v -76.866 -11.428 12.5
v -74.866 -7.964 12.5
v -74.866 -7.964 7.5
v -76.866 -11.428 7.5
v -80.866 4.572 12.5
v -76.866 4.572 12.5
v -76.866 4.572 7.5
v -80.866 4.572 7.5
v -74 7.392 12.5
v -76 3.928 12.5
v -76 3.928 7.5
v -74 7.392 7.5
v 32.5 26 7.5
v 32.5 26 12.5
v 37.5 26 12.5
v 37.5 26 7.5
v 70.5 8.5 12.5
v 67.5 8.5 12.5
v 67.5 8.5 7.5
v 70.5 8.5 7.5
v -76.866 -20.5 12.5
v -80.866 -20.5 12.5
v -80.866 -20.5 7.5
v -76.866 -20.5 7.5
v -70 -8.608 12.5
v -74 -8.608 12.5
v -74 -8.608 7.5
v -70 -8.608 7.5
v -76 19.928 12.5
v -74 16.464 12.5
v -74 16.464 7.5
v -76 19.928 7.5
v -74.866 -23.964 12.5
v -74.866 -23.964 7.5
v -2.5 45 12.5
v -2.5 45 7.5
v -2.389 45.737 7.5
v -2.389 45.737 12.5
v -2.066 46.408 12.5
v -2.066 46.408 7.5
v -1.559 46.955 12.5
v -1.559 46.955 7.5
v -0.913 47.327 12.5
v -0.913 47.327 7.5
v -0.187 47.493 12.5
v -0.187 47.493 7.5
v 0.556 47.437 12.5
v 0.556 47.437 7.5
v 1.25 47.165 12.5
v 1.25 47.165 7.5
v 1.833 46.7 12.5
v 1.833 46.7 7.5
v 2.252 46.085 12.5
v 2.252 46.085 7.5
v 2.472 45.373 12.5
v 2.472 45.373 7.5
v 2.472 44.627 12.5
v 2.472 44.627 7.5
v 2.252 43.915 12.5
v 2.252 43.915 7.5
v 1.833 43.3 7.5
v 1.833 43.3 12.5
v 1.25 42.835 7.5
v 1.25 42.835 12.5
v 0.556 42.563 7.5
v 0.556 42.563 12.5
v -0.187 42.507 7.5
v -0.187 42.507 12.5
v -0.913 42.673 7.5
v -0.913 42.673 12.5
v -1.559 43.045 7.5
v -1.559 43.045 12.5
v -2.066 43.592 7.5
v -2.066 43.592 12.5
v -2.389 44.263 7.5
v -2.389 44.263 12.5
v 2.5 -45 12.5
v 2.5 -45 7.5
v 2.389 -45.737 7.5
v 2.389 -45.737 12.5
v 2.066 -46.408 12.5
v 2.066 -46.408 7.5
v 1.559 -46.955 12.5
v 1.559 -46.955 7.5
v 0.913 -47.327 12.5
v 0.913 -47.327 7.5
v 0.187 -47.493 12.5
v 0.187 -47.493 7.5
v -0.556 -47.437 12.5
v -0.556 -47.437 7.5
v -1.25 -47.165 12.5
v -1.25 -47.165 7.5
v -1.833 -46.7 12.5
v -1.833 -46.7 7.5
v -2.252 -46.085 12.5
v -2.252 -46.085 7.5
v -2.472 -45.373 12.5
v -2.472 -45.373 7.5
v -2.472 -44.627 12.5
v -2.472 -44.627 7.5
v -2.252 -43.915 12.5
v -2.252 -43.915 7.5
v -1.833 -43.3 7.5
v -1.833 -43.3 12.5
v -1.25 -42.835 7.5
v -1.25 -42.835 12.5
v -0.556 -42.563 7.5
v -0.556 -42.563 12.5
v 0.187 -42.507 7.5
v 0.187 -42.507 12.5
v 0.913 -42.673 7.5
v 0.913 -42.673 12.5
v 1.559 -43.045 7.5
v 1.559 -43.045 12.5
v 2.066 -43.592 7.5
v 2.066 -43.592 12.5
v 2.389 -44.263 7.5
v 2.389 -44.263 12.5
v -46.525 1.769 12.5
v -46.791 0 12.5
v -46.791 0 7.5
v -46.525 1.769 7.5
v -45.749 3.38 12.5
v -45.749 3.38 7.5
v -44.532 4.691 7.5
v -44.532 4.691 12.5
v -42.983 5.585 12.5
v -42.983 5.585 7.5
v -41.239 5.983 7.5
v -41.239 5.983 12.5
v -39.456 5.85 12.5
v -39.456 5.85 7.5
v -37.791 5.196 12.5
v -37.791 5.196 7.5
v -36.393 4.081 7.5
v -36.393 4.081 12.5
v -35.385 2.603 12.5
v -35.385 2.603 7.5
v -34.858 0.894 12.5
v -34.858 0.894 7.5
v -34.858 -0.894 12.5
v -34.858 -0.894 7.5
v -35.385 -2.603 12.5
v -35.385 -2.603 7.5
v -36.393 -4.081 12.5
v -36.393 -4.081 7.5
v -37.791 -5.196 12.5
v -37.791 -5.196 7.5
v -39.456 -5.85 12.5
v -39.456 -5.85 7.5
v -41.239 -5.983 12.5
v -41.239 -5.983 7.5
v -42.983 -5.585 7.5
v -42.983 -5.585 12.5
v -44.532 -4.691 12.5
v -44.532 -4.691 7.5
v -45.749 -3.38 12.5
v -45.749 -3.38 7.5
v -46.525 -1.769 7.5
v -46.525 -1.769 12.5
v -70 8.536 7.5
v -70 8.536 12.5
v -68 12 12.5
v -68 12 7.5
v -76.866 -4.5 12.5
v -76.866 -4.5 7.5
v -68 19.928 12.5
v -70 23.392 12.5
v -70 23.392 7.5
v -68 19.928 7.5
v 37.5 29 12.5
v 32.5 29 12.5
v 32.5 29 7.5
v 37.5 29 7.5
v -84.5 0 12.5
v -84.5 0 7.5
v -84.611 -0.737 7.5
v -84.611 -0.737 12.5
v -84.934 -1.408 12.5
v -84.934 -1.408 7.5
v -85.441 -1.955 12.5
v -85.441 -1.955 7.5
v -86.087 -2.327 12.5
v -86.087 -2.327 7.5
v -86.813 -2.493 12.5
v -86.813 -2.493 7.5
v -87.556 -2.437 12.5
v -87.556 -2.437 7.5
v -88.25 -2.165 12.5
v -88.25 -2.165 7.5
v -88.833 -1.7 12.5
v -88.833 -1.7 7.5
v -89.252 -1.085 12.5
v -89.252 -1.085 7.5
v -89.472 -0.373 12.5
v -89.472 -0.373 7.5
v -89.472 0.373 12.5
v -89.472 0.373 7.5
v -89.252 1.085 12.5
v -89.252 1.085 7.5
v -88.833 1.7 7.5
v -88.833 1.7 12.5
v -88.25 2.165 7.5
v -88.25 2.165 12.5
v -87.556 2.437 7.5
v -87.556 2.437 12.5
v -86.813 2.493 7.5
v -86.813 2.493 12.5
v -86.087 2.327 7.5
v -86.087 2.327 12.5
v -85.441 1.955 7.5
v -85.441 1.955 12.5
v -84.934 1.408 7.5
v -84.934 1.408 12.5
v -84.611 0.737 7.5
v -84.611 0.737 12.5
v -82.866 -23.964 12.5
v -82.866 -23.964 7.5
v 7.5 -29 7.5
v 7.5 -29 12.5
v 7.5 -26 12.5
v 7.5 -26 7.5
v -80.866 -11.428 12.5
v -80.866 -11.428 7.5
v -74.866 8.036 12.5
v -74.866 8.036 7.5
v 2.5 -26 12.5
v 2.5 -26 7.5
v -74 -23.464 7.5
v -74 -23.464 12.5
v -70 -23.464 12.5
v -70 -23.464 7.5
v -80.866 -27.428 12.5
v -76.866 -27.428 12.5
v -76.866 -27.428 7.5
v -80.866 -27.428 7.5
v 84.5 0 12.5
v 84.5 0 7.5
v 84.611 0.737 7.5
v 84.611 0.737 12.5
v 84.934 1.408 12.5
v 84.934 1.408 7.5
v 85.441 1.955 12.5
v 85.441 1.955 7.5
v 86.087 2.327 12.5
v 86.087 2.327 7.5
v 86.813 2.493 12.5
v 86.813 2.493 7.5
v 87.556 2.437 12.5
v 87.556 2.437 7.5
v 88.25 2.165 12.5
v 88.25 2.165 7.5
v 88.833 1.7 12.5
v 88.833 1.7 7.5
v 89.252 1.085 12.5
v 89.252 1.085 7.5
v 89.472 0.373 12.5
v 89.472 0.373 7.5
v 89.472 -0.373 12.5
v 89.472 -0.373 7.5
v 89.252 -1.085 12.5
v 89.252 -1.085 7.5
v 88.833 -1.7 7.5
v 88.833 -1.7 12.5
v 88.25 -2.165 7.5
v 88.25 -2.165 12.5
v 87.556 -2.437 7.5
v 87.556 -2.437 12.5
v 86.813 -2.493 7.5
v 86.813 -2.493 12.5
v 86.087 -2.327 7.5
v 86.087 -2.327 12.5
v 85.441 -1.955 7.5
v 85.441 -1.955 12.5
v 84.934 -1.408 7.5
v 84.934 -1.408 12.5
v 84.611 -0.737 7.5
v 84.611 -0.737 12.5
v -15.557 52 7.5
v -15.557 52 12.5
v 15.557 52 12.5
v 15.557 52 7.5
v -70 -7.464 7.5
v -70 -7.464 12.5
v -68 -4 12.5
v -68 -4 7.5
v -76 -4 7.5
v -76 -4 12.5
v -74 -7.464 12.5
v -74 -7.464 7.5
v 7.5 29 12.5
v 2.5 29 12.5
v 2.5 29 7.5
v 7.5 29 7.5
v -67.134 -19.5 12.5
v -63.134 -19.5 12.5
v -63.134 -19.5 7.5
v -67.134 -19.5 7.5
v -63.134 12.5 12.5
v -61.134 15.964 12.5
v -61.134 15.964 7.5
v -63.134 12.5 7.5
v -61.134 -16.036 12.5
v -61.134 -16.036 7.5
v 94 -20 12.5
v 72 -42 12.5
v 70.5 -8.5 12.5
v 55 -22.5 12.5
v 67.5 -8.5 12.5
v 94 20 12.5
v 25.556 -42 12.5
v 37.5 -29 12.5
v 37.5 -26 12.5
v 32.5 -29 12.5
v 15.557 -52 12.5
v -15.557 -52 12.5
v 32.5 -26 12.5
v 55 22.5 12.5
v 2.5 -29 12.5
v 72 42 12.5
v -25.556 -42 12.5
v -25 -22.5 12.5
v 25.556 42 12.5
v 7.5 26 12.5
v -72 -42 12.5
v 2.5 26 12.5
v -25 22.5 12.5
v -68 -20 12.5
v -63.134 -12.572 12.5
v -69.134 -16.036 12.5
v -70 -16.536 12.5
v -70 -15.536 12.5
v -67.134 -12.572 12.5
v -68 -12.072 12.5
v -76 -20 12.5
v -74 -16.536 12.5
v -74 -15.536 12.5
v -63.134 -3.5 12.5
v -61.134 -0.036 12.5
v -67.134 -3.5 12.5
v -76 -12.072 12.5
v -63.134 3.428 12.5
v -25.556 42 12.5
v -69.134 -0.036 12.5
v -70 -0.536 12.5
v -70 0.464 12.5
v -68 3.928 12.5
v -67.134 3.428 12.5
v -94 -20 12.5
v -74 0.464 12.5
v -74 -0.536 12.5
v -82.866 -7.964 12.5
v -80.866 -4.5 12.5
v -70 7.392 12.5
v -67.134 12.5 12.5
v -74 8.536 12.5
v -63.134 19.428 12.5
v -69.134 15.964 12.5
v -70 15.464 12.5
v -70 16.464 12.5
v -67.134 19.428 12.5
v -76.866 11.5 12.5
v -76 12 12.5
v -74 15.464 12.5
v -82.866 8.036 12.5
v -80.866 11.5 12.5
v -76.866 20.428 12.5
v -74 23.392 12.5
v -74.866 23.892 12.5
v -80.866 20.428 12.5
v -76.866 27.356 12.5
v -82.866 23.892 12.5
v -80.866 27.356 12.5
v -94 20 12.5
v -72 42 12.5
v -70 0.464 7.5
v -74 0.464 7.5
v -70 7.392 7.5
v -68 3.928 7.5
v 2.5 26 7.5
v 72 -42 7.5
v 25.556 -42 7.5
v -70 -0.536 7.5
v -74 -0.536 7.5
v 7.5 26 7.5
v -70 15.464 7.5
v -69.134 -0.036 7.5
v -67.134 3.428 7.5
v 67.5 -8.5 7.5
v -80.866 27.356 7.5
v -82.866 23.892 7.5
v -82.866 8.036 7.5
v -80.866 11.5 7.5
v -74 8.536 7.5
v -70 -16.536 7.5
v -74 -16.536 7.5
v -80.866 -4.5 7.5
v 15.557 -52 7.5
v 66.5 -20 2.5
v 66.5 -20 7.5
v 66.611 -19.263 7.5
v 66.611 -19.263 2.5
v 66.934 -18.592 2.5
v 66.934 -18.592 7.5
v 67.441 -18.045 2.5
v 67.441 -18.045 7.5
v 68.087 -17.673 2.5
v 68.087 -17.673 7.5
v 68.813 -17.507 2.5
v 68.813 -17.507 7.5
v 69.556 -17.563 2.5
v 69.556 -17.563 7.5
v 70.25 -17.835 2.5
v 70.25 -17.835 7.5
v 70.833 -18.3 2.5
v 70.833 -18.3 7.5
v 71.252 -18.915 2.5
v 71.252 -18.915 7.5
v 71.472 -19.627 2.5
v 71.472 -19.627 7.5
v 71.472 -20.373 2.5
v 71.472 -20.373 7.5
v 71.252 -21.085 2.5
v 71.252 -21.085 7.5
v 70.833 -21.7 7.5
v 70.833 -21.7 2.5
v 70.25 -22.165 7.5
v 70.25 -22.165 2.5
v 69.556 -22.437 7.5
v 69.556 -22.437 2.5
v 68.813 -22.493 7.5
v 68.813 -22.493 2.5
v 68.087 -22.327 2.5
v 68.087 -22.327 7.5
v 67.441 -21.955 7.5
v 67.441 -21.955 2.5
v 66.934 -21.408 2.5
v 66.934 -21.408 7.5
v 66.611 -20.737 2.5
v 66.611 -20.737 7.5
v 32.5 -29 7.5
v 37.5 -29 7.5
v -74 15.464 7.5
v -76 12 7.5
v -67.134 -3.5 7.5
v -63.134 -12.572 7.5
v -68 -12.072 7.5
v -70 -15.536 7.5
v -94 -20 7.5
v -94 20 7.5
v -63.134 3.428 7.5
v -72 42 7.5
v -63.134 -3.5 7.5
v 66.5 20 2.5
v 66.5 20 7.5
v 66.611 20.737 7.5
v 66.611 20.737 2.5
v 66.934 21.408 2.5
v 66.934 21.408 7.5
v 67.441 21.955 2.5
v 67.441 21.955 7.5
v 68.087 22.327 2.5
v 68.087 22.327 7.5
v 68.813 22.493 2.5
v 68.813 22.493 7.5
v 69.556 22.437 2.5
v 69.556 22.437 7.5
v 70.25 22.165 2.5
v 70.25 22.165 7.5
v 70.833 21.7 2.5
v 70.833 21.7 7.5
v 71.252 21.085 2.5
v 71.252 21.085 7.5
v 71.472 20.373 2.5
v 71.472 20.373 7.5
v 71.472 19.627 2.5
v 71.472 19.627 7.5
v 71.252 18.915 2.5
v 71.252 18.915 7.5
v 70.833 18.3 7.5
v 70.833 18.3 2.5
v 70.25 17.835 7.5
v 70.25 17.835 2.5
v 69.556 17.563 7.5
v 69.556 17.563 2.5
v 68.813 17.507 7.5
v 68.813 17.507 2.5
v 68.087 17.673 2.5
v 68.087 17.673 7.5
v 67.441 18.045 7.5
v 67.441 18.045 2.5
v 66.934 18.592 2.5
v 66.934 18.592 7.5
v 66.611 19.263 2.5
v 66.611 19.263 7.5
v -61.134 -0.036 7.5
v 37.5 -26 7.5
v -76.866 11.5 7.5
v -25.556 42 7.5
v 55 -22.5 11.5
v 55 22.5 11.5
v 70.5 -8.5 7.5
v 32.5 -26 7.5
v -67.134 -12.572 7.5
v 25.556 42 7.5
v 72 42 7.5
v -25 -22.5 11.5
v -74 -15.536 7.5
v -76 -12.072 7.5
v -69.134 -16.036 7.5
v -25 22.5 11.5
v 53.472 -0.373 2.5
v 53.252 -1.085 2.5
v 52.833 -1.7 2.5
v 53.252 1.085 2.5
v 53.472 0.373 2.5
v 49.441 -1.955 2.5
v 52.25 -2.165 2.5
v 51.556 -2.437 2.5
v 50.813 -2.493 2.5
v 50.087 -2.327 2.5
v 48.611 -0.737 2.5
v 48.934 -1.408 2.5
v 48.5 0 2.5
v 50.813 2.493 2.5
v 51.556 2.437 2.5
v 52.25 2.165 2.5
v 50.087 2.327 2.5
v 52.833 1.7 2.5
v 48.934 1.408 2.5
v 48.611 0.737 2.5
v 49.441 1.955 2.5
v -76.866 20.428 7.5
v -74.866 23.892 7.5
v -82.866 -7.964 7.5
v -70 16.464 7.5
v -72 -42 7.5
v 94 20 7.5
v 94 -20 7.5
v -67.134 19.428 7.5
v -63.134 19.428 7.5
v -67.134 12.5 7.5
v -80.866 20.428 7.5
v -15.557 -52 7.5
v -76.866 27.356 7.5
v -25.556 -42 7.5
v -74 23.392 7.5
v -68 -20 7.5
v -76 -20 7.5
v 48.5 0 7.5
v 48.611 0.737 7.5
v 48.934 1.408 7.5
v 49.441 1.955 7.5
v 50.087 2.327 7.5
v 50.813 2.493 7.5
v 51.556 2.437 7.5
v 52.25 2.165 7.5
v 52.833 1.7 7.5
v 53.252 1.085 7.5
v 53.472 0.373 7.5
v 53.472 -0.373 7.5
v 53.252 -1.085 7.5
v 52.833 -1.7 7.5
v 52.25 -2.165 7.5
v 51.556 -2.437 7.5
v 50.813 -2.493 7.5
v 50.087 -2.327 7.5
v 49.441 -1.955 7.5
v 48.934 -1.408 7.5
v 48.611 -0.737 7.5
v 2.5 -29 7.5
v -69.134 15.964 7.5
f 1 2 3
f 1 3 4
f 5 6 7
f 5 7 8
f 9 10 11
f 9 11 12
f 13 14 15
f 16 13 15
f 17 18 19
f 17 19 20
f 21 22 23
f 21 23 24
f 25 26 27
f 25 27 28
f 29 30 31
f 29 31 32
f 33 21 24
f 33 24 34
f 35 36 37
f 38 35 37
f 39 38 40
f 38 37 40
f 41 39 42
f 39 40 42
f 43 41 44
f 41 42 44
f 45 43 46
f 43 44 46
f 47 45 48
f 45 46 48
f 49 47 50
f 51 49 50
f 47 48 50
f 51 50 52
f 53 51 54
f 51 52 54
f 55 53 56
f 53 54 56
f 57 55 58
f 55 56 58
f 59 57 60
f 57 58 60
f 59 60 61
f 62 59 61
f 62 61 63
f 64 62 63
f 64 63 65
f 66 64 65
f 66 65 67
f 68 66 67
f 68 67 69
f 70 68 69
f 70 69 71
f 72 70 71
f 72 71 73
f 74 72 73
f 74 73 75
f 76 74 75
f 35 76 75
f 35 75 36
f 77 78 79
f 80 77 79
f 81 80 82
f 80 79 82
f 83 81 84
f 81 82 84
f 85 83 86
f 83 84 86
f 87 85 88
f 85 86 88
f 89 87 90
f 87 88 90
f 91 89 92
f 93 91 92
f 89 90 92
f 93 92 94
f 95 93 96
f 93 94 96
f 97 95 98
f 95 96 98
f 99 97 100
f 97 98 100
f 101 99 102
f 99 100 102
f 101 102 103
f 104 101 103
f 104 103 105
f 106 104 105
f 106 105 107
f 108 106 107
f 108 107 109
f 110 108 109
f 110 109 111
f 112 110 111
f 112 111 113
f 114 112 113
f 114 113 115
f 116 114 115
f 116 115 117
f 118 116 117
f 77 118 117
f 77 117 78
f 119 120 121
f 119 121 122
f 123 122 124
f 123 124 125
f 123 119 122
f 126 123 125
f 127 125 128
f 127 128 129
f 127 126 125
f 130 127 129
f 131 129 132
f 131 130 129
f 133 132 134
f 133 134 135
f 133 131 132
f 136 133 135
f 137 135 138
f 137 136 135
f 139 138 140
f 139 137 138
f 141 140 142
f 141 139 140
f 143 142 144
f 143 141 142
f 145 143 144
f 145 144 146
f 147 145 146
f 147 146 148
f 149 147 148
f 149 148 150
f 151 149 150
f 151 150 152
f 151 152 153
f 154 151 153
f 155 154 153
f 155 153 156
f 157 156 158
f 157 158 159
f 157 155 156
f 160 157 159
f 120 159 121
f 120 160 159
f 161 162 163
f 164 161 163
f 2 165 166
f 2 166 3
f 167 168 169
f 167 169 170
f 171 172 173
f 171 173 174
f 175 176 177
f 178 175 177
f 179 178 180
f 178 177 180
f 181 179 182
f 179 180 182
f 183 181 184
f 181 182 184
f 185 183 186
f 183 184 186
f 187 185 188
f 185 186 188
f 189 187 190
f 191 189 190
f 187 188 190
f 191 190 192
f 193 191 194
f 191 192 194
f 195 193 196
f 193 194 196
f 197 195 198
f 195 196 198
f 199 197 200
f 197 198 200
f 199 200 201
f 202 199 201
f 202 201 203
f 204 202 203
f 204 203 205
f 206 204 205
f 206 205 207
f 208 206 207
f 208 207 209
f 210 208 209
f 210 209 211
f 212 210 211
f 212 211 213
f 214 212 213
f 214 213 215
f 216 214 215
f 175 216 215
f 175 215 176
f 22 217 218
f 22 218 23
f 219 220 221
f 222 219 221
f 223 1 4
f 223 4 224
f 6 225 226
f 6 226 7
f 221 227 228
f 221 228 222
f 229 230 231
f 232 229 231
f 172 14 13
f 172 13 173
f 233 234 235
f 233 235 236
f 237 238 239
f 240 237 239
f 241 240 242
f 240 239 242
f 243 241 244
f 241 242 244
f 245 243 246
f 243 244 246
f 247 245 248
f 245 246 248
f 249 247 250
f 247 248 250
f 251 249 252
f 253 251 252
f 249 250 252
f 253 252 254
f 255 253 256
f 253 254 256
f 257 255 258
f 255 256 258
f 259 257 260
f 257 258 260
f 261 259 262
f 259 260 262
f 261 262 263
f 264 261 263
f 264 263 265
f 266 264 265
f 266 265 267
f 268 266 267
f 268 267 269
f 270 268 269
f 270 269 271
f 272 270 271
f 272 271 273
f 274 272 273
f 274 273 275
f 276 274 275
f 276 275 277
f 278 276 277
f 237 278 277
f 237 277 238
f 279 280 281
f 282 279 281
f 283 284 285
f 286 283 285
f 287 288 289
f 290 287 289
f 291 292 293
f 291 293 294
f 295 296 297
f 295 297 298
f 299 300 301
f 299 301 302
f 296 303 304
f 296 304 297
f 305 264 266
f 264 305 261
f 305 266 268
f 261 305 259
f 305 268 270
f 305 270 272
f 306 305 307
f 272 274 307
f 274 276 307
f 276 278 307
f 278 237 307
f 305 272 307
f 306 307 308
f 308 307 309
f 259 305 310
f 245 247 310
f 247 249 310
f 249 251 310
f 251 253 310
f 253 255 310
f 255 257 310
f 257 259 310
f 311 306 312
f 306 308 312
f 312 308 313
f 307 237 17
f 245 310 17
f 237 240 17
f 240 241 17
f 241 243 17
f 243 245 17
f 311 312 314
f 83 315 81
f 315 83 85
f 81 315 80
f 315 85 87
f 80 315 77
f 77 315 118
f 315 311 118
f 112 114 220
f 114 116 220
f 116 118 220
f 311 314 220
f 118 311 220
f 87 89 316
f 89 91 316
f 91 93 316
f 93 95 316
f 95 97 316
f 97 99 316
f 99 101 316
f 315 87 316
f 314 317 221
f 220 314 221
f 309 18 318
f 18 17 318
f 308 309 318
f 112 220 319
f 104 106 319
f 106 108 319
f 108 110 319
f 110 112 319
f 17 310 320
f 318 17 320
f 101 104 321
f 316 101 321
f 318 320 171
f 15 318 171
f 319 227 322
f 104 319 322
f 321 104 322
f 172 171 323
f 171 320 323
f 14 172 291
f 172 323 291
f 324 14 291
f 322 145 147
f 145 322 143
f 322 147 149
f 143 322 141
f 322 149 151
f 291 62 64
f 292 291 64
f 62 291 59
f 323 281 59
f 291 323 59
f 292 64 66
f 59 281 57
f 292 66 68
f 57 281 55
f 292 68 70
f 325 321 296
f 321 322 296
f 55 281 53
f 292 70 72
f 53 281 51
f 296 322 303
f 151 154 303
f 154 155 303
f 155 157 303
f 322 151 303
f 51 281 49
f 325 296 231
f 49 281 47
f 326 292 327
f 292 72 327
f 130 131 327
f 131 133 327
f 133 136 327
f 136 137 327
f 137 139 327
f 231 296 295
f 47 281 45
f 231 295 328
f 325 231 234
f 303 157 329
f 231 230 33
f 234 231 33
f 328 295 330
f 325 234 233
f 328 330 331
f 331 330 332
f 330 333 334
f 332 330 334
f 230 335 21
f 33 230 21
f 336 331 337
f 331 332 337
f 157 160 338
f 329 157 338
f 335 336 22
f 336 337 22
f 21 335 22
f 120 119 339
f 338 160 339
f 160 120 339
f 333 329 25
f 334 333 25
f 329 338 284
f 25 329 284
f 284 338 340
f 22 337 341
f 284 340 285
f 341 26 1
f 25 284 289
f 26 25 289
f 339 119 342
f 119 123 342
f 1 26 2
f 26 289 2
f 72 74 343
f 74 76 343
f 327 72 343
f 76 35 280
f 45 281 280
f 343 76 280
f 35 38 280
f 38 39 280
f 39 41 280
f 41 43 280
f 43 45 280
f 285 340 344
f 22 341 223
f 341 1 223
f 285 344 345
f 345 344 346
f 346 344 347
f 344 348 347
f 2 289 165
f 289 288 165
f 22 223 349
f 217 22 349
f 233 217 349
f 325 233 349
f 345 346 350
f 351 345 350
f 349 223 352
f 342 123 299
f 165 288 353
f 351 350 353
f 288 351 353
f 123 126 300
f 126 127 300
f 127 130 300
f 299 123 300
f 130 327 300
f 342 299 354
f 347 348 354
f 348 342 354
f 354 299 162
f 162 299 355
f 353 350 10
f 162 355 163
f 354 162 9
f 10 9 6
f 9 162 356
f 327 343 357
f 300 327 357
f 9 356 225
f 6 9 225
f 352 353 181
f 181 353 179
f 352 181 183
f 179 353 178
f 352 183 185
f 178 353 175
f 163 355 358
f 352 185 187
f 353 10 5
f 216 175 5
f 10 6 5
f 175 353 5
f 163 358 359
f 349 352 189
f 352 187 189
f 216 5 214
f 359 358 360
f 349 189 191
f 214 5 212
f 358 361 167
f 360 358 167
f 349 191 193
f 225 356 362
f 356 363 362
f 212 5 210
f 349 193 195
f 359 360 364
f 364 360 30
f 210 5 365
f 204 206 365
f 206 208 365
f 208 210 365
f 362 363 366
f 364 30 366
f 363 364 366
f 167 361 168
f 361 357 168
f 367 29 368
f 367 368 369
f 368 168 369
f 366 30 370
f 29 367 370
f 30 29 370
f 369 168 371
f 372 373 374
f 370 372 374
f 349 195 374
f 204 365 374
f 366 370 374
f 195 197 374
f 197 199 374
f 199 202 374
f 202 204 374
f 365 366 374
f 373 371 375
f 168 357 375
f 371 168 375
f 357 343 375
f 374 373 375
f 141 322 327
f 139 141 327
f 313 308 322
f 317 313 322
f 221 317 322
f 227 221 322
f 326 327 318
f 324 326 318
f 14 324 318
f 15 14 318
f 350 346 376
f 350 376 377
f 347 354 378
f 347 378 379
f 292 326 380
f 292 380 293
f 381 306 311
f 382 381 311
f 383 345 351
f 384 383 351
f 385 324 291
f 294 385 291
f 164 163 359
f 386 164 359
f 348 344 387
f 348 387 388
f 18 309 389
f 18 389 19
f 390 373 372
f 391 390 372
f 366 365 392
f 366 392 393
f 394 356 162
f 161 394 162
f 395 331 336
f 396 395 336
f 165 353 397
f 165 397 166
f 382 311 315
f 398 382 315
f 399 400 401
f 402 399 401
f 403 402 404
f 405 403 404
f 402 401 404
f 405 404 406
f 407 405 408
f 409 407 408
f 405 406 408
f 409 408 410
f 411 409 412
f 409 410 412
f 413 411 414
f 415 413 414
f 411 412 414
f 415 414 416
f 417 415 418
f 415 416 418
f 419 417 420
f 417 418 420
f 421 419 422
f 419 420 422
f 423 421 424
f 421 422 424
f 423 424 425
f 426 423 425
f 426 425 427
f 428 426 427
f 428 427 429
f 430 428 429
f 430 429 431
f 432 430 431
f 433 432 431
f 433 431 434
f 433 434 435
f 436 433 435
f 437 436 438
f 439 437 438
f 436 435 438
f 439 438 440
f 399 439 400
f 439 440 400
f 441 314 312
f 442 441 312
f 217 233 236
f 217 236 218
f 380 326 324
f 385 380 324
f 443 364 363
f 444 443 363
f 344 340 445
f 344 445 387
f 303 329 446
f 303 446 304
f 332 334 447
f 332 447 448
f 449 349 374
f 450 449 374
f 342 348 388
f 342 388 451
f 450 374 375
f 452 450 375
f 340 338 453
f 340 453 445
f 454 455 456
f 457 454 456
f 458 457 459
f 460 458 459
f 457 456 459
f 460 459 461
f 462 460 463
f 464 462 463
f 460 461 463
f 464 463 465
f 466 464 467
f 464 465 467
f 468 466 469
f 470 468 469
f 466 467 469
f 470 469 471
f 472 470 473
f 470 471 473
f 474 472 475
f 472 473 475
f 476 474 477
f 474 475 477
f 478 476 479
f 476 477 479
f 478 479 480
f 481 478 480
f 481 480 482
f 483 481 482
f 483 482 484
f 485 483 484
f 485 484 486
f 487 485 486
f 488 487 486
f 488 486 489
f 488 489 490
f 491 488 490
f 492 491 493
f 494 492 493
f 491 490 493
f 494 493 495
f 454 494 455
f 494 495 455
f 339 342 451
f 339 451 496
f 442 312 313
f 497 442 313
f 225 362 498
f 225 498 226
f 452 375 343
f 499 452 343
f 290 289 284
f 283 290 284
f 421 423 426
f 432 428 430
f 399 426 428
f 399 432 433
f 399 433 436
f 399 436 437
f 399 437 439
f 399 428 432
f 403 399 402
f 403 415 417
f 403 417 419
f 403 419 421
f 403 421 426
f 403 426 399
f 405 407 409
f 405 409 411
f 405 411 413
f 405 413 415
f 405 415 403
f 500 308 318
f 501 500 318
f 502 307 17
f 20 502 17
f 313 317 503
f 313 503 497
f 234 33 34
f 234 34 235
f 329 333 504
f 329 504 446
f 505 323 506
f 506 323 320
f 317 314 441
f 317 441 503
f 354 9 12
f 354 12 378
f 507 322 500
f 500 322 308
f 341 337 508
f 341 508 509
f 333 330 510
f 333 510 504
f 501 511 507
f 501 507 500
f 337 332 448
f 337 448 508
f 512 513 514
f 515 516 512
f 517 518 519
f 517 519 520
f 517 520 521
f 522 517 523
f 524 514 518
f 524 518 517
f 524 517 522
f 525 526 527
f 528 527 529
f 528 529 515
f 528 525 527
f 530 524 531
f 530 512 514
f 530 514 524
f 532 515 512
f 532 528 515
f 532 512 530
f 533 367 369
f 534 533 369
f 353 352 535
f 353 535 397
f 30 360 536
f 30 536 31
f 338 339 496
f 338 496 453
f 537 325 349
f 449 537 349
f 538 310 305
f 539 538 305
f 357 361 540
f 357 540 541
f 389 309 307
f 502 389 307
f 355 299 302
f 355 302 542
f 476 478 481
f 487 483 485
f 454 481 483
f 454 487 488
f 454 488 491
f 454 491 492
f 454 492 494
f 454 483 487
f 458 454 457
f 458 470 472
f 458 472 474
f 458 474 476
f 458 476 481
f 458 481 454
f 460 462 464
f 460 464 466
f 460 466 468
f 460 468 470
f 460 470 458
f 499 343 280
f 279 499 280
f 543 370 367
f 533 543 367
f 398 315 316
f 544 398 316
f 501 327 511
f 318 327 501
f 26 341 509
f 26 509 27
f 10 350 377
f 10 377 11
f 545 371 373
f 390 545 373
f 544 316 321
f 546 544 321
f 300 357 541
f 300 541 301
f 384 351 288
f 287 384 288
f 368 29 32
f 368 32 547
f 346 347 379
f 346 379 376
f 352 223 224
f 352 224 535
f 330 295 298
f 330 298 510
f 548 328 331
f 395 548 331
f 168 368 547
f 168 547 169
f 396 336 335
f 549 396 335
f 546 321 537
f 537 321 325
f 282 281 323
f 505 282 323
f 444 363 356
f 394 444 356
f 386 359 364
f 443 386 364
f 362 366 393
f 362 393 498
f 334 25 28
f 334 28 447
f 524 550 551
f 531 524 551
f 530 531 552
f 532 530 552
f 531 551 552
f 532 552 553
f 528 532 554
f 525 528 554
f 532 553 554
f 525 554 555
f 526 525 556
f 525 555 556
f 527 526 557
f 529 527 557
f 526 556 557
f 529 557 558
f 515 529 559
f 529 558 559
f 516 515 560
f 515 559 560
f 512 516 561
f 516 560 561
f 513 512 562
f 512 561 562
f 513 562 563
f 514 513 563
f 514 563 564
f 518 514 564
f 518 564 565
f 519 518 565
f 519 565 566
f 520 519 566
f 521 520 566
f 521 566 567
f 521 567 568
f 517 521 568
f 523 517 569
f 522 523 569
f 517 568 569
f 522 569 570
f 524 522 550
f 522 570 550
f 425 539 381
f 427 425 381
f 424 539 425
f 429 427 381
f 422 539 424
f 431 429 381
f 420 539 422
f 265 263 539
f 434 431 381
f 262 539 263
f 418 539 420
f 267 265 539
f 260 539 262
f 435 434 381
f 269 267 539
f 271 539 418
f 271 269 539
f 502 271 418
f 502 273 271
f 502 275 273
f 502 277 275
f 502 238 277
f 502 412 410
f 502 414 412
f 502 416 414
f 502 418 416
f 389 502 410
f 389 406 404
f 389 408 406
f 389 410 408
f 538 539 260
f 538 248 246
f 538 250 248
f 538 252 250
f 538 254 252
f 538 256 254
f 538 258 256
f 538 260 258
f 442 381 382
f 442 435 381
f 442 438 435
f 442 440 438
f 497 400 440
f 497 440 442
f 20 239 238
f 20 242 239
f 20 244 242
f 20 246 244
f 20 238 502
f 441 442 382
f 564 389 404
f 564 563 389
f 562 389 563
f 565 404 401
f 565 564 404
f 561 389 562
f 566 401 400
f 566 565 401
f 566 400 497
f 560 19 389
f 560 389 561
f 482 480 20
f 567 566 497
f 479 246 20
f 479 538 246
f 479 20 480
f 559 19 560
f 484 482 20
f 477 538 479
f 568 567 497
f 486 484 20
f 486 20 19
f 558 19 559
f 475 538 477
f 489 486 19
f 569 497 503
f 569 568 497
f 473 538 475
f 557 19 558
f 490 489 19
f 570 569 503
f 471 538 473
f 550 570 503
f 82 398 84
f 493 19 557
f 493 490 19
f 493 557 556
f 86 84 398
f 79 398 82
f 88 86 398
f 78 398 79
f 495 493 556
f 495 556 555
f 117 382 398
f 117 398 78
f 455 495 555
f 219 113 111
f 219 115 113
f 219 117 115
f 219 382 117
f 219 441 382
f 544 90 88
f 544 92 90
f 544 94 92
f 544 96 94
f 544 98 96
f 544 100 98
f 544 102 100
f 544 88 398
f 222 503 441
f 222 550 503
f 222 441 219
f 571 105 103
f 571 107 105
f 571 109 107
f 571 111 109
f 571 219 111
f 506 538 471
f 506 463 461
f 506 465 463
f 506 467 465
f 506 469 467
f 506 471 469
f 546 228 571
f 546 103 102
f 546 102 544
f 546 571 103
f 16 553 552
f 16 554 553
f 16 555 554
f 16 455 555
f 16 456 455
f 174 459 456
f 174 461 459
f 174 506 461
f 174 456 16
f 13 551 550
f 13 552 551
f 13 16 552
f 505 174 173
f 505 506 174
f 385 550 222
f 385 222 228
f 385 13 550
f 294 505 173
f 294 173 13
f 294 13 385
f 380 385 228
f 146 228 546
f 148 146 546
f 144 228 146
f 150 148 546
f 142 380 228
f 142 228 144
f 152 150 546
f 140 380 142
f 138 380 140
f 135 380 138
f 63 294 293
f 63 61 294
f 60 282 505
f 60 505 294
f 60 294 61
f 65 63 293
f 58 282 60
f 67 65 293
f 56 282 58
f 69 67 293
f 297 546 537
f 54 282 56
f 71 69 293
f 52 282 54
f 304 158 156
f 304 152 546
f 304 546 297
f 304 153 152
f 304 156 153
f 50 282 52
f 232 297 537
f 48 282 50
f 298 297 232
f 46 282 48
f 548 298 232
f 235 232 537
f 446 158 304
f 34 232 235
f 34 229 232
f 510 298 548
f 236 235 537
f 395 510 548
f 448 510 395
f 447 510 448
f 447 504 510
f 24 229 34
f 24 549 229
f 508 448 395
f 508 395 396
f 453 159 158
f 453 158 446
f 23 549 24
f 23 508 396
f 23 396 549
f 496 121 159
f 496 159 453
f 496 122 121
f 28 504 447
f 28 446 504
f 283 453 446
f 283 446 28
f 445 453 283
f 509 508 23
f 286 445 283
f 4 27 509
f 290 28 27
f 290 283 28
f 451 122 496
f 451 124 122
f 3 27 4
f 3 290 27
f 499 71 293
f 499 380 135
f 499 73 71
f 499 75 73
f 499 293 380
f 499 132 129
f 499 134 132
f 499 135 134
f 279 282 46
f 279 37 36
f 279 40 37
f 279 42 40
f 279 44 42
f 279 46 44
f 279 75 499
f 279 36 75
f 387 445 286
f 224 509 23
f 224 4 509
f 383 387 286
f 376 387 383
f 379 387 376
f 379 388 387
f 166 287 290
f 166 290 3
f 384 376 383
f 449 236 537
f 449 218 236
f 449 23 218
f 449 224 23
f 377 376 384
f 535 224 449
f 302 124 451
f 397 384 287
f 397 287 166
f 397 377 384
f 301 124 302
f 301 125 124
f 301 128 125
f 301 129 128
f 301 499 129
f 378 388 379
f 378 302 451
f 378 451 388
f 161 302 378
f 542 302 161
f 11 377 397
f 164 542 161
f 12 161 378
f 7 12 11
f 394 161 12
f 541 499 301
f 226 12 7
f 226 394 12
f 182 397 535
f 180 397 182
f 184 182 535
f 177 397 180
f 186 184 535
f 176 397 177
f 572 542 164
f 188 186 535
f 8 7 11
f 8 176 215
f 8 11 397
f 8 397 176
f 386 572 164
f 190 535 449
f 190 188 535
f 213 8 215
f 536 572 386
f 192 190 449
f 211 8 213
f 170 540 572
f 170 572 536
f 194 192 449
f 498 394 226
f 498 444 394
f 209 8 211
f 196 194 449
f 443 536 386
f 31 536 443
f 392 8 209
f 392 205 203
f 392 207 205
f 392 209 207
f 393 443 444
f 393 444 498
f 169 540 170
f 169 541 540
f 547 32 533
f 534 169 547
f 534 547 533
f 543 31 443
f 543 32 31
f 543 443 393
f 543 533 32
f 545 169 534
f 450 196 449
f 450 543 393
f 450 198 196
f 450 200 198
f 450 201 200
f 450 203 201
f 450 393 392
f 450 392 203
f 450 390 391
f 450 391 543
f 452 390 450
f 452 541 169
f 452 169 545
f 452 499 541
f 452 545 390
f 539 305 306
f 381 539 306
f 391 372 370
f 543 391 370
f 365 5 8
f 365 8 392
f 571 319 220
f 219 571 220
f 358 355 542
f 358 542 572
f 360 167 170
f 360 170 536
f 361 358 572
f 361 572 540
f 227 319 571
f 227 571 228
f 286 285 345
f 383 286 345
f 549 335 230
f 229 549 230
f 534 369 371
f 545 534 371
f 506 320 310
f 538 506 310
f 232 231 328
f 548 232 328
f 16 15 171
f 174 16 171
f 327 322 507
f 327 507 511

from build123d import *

# Parameters (mm, degrees)
BASE_FLANGE1_OUTLINE_R  = 6
BASE_FLANGE1_DEPTH      = 5
SKETCH3_W               = 80
SKETCH3_H               = 45
CUT_EXTRUDE1_DEPTH      = 1
CROQUIS1_W              = 5
CROQUIS1_H              = 3
CORTAR_EXTRUIR1_DEPTH   = 108.540687679
CROQUIS2_R              = 2.5
CORTAR_EXTRUIR2_DEPTH   = 108.540687679
CROQUIS3_R              = 2.5
SALIENTE_EXTRUIR1_DEPTH = 5
CUT_EXTRUDE3_DEPTH      = 10
SKETCH9_W               = 3
SKETCH9_H               = 17
CUT_EXTRUDE4_DEPTH      = 10


# Read off the part's stored shape, not the designer's step: Base-Flange1
with BuildPart() as part:
    # Base-Flange1 outline → Base-Flange1 (new body)
    with BuildSketch(Plane(origin=(0, 0, 12.500000186), x_dir=(-1, 0, 0), z_dir=(0, 0, -1))):
        Polygon((-93.999996781, 19.999999553), (-93.999996781, -19.999999553), (-71.999996901, -41.999999434), (-25.556499138, -41.999999434), (-15.556500293, -52.000001073), (15.556500293, -52.000001073), (25.556499138, -41.999999434), (71.999996901, -41.999999434), (93.999996781, -19.999999553), (93.999996781, 19.999999553), (71.999996901, 41.999999434), (25.556499138, 41.999999434), (15.556500293, 52.000001073), (-15.556500293, 52.000001073), (-25.556499138, 41.999999434), (-71.999996901, 41.999999434), align=None)
        with Locations((40.791069868, 0)):
            Circle(BASE_FLANGE1_OUTLINE_R, mode=Mode.SUBTRACT)
    extrude(amount=BASE_FLANGE1_DEPTH)

    # Sketch3 → Cut-Extrude1 (cut)
    with BuildSketch(Plane.XY.offset(12.500000186)):
        with Locations((15, 0)):
            Rectangle(SKETCH3_W, SKETCH3_H)
    extrude(amount=-CUT_EXTRUDE1_DEPTH, mode=Mode.SUBTRACT)

    # Croquis1 → Cortar-Extruir1 (cut, through all)
    with BuildSketch(Plane.XY.offset(12.500000186)):
        with Locations((5, 27.5)):
            Rectangle(CROQUIS1_W, CROQUIS1_H)
        with Locations((35, 27.5)):
            Rectangle(CROQUIS1_W, CROQUIS1_H)
        with Locations((35, -27.5)):
            Rectangle(CROQUIS1_W, CROQUIS1_H)
        with Locations((5, -27.5)):
            Rectangle(CROQUIS1_W, CROQUIS1_H)
    extrude(amount=-CORTAR_EXTRUIR1_DEPTH, mode=Mode.SUBTRACT)

    # Croquis2 → Cortar-Extruir2 (cut, through all)
    with BuildSketch(Plane(origin=(0, 0, 7.500000186), x_dir=(-1, 0, 0), z_dir=(0, 0, -1))):
        with Locations((-86.999996781, 0)):
            Circle(CROQUIS2_R)
        with Locations(Location((86.999996781, 0, 0), (0, 0, 180))):
            Circle(CROQUIS2_R)
        with Locations((0, 45.000001073)):
            Circle(CROQUIS2_R)
        with Locations(Location((0, -45.000001073, 0), (0, 0, 180))):
            Circle(CROQUIS2_R)
    extrude(amount=-CORTAR_EXTRUIR2_DEPTH, mode=Mode.SUBTRACT)

    # Croquis3 → Saliente-Extruir1 (add)
    with BuildSketch(Plane(origin=(0, 0, 7.500000186), x_dir=(-1, 0, 0), z_dir=(0, 0, -1))):
        with Locations((-50.999996781, 0)):
            Circle(CROQUIS3_R)
        with Locations((-68.999996781, 20)):
            Circle(CROQUIS3_R)
        with Locations((-68.999996781, -20)):
            Circle(CROQUIS3_R)
    extrude(amount=SALIENTE_EXTRUIR1_DEPTH)

    # Sketch8 → Cut-Extrude3 (cut)
    with BuildSketch(Plane.XY.offset(12.500000186)):
        Polygon((-67.999996901, -19.999999553), (-69.999996901, -16.535897938), (-73.999996901, -16.535897938), (-75.999996901, -19.999999553), (-73.999996901, -23.464101168), (-69.999996901, -23.464101168), align=None)
        Polygon((-69.999996901, -8.607694708), (-67.999996901, -12.071796323), (-69.999996901, -15.535897938), (-73.999996901, -15.535897938), (-75.999996901, -12.071796323), (-73.999996901, -8.607694708), align=None)
        Polygon((-63.133971497, -19.499999553), (-67.133971497, -19.499999553), (-69.133971497, -16.035897938), (-67.133971497, -12.571796323), (-63.133971497, -12.571796323), (-61.133971497, -16.035897938), align=None)
        Polygon((-67.999996901, -3.999999553), (-69.999996901, -0.535897938), (-73.999996901, -0.535897938), (-75.999996901, -3.999999553), (-73.999996901, -7.464101168), (-69.999996901, -7.464101168), align=None)
        Polygon((-76.866022304, -27.428202783), (-80.866022304, -27.428202783), (-82.866022304, -23.964101168), (-80.866022304, -20.499999553), (-76.866022304, -20.499999553), (-74.866022304, -23.964101168), align=None)
        Polygon((-69.999996901, 7.392305292), (-67.999996901, 3.928203677), (-69.999996901, 0.464102062), (-73.999996901, 0.464102062), (-75.999996901, 3.928203677), (-73.999996901, 7.392305292), align=None)
        Polygon((-63.133971497, -3.499999553), (-67.133971497, -3.499999553), (-69.133971497, -0.035897938), (-67.133971497, 3.428203677), (-63.133971497, 3.428203677), (-61.133971497, -0.035897938), align=None)
        Polygon((-76.866022304, -11.428202783), (-80.866022304, -11.428202783), (-82.866022304, -7.964101168), (-80.866022304, -4.499999553), (-76.866022304, -4.499999553), (-74.866022304, -7.964101168), align=None)
        Polygon((-67.999996901, 12.000000447), (-69.999996901, 15.464102062), (-73.999996901, 15.464102062), (-75.999996901, 12.000000447), (-73.999996901, 8.535898832), (-69.999996901, 8.535898832), align=None)
        Polygon((-69.999996901, 23.392305292), (-67.999996901, 19.928203677), (-69.999996901, 16.464102062), (-73.999996901, 16.464102062), (-75.999996901, 19.928203677), (-73.999996901, 23.392305292), align=None)
        Polygon((-63.133971497, 12.500000447), (-67.133971497, 12.500000447), (-69.133971497, 15.964102062), (-67.133971497, 19.428203677), (-63.133971497, 19.428203677), (-61.133971497, 15.964102062), align=None)
        Polygon((-76.866022304, 4.571797217), (-80.866022304, 4.571797217), (-82.866022304, 8.035898832), (-80.866022304, 11.500000447), (-76.866022304, 11.500000447), (-74.866022304, 8.035898832), align=None)
        Polygon((-74.866022304, 23.892305292), (-76.866022304, 27.356406908), (-80.866022304, 27.356406908), (-82.866022304, 23.892305292), (-80.866022304, 20.428203677), (-76.866022304, 20.428203677), align=None)
    extrude(amount=-CUT_EXTRUDE3_DEPTH, mode=Mode.SUBTRACT)

    # Sketch9 → Cut-Extrude4 (cut)
    with BuildSketch(Plane.XY.offset(12.500000186)):
        with Locations((68.999996781, 0)):
            Rectangle(SKETCH9_W, SKETCH9_H)
    extrude(amount=-CUT_EXTRUDE4_DEPTH, mode=Mode.SUBTRACT)


solid = part.part
